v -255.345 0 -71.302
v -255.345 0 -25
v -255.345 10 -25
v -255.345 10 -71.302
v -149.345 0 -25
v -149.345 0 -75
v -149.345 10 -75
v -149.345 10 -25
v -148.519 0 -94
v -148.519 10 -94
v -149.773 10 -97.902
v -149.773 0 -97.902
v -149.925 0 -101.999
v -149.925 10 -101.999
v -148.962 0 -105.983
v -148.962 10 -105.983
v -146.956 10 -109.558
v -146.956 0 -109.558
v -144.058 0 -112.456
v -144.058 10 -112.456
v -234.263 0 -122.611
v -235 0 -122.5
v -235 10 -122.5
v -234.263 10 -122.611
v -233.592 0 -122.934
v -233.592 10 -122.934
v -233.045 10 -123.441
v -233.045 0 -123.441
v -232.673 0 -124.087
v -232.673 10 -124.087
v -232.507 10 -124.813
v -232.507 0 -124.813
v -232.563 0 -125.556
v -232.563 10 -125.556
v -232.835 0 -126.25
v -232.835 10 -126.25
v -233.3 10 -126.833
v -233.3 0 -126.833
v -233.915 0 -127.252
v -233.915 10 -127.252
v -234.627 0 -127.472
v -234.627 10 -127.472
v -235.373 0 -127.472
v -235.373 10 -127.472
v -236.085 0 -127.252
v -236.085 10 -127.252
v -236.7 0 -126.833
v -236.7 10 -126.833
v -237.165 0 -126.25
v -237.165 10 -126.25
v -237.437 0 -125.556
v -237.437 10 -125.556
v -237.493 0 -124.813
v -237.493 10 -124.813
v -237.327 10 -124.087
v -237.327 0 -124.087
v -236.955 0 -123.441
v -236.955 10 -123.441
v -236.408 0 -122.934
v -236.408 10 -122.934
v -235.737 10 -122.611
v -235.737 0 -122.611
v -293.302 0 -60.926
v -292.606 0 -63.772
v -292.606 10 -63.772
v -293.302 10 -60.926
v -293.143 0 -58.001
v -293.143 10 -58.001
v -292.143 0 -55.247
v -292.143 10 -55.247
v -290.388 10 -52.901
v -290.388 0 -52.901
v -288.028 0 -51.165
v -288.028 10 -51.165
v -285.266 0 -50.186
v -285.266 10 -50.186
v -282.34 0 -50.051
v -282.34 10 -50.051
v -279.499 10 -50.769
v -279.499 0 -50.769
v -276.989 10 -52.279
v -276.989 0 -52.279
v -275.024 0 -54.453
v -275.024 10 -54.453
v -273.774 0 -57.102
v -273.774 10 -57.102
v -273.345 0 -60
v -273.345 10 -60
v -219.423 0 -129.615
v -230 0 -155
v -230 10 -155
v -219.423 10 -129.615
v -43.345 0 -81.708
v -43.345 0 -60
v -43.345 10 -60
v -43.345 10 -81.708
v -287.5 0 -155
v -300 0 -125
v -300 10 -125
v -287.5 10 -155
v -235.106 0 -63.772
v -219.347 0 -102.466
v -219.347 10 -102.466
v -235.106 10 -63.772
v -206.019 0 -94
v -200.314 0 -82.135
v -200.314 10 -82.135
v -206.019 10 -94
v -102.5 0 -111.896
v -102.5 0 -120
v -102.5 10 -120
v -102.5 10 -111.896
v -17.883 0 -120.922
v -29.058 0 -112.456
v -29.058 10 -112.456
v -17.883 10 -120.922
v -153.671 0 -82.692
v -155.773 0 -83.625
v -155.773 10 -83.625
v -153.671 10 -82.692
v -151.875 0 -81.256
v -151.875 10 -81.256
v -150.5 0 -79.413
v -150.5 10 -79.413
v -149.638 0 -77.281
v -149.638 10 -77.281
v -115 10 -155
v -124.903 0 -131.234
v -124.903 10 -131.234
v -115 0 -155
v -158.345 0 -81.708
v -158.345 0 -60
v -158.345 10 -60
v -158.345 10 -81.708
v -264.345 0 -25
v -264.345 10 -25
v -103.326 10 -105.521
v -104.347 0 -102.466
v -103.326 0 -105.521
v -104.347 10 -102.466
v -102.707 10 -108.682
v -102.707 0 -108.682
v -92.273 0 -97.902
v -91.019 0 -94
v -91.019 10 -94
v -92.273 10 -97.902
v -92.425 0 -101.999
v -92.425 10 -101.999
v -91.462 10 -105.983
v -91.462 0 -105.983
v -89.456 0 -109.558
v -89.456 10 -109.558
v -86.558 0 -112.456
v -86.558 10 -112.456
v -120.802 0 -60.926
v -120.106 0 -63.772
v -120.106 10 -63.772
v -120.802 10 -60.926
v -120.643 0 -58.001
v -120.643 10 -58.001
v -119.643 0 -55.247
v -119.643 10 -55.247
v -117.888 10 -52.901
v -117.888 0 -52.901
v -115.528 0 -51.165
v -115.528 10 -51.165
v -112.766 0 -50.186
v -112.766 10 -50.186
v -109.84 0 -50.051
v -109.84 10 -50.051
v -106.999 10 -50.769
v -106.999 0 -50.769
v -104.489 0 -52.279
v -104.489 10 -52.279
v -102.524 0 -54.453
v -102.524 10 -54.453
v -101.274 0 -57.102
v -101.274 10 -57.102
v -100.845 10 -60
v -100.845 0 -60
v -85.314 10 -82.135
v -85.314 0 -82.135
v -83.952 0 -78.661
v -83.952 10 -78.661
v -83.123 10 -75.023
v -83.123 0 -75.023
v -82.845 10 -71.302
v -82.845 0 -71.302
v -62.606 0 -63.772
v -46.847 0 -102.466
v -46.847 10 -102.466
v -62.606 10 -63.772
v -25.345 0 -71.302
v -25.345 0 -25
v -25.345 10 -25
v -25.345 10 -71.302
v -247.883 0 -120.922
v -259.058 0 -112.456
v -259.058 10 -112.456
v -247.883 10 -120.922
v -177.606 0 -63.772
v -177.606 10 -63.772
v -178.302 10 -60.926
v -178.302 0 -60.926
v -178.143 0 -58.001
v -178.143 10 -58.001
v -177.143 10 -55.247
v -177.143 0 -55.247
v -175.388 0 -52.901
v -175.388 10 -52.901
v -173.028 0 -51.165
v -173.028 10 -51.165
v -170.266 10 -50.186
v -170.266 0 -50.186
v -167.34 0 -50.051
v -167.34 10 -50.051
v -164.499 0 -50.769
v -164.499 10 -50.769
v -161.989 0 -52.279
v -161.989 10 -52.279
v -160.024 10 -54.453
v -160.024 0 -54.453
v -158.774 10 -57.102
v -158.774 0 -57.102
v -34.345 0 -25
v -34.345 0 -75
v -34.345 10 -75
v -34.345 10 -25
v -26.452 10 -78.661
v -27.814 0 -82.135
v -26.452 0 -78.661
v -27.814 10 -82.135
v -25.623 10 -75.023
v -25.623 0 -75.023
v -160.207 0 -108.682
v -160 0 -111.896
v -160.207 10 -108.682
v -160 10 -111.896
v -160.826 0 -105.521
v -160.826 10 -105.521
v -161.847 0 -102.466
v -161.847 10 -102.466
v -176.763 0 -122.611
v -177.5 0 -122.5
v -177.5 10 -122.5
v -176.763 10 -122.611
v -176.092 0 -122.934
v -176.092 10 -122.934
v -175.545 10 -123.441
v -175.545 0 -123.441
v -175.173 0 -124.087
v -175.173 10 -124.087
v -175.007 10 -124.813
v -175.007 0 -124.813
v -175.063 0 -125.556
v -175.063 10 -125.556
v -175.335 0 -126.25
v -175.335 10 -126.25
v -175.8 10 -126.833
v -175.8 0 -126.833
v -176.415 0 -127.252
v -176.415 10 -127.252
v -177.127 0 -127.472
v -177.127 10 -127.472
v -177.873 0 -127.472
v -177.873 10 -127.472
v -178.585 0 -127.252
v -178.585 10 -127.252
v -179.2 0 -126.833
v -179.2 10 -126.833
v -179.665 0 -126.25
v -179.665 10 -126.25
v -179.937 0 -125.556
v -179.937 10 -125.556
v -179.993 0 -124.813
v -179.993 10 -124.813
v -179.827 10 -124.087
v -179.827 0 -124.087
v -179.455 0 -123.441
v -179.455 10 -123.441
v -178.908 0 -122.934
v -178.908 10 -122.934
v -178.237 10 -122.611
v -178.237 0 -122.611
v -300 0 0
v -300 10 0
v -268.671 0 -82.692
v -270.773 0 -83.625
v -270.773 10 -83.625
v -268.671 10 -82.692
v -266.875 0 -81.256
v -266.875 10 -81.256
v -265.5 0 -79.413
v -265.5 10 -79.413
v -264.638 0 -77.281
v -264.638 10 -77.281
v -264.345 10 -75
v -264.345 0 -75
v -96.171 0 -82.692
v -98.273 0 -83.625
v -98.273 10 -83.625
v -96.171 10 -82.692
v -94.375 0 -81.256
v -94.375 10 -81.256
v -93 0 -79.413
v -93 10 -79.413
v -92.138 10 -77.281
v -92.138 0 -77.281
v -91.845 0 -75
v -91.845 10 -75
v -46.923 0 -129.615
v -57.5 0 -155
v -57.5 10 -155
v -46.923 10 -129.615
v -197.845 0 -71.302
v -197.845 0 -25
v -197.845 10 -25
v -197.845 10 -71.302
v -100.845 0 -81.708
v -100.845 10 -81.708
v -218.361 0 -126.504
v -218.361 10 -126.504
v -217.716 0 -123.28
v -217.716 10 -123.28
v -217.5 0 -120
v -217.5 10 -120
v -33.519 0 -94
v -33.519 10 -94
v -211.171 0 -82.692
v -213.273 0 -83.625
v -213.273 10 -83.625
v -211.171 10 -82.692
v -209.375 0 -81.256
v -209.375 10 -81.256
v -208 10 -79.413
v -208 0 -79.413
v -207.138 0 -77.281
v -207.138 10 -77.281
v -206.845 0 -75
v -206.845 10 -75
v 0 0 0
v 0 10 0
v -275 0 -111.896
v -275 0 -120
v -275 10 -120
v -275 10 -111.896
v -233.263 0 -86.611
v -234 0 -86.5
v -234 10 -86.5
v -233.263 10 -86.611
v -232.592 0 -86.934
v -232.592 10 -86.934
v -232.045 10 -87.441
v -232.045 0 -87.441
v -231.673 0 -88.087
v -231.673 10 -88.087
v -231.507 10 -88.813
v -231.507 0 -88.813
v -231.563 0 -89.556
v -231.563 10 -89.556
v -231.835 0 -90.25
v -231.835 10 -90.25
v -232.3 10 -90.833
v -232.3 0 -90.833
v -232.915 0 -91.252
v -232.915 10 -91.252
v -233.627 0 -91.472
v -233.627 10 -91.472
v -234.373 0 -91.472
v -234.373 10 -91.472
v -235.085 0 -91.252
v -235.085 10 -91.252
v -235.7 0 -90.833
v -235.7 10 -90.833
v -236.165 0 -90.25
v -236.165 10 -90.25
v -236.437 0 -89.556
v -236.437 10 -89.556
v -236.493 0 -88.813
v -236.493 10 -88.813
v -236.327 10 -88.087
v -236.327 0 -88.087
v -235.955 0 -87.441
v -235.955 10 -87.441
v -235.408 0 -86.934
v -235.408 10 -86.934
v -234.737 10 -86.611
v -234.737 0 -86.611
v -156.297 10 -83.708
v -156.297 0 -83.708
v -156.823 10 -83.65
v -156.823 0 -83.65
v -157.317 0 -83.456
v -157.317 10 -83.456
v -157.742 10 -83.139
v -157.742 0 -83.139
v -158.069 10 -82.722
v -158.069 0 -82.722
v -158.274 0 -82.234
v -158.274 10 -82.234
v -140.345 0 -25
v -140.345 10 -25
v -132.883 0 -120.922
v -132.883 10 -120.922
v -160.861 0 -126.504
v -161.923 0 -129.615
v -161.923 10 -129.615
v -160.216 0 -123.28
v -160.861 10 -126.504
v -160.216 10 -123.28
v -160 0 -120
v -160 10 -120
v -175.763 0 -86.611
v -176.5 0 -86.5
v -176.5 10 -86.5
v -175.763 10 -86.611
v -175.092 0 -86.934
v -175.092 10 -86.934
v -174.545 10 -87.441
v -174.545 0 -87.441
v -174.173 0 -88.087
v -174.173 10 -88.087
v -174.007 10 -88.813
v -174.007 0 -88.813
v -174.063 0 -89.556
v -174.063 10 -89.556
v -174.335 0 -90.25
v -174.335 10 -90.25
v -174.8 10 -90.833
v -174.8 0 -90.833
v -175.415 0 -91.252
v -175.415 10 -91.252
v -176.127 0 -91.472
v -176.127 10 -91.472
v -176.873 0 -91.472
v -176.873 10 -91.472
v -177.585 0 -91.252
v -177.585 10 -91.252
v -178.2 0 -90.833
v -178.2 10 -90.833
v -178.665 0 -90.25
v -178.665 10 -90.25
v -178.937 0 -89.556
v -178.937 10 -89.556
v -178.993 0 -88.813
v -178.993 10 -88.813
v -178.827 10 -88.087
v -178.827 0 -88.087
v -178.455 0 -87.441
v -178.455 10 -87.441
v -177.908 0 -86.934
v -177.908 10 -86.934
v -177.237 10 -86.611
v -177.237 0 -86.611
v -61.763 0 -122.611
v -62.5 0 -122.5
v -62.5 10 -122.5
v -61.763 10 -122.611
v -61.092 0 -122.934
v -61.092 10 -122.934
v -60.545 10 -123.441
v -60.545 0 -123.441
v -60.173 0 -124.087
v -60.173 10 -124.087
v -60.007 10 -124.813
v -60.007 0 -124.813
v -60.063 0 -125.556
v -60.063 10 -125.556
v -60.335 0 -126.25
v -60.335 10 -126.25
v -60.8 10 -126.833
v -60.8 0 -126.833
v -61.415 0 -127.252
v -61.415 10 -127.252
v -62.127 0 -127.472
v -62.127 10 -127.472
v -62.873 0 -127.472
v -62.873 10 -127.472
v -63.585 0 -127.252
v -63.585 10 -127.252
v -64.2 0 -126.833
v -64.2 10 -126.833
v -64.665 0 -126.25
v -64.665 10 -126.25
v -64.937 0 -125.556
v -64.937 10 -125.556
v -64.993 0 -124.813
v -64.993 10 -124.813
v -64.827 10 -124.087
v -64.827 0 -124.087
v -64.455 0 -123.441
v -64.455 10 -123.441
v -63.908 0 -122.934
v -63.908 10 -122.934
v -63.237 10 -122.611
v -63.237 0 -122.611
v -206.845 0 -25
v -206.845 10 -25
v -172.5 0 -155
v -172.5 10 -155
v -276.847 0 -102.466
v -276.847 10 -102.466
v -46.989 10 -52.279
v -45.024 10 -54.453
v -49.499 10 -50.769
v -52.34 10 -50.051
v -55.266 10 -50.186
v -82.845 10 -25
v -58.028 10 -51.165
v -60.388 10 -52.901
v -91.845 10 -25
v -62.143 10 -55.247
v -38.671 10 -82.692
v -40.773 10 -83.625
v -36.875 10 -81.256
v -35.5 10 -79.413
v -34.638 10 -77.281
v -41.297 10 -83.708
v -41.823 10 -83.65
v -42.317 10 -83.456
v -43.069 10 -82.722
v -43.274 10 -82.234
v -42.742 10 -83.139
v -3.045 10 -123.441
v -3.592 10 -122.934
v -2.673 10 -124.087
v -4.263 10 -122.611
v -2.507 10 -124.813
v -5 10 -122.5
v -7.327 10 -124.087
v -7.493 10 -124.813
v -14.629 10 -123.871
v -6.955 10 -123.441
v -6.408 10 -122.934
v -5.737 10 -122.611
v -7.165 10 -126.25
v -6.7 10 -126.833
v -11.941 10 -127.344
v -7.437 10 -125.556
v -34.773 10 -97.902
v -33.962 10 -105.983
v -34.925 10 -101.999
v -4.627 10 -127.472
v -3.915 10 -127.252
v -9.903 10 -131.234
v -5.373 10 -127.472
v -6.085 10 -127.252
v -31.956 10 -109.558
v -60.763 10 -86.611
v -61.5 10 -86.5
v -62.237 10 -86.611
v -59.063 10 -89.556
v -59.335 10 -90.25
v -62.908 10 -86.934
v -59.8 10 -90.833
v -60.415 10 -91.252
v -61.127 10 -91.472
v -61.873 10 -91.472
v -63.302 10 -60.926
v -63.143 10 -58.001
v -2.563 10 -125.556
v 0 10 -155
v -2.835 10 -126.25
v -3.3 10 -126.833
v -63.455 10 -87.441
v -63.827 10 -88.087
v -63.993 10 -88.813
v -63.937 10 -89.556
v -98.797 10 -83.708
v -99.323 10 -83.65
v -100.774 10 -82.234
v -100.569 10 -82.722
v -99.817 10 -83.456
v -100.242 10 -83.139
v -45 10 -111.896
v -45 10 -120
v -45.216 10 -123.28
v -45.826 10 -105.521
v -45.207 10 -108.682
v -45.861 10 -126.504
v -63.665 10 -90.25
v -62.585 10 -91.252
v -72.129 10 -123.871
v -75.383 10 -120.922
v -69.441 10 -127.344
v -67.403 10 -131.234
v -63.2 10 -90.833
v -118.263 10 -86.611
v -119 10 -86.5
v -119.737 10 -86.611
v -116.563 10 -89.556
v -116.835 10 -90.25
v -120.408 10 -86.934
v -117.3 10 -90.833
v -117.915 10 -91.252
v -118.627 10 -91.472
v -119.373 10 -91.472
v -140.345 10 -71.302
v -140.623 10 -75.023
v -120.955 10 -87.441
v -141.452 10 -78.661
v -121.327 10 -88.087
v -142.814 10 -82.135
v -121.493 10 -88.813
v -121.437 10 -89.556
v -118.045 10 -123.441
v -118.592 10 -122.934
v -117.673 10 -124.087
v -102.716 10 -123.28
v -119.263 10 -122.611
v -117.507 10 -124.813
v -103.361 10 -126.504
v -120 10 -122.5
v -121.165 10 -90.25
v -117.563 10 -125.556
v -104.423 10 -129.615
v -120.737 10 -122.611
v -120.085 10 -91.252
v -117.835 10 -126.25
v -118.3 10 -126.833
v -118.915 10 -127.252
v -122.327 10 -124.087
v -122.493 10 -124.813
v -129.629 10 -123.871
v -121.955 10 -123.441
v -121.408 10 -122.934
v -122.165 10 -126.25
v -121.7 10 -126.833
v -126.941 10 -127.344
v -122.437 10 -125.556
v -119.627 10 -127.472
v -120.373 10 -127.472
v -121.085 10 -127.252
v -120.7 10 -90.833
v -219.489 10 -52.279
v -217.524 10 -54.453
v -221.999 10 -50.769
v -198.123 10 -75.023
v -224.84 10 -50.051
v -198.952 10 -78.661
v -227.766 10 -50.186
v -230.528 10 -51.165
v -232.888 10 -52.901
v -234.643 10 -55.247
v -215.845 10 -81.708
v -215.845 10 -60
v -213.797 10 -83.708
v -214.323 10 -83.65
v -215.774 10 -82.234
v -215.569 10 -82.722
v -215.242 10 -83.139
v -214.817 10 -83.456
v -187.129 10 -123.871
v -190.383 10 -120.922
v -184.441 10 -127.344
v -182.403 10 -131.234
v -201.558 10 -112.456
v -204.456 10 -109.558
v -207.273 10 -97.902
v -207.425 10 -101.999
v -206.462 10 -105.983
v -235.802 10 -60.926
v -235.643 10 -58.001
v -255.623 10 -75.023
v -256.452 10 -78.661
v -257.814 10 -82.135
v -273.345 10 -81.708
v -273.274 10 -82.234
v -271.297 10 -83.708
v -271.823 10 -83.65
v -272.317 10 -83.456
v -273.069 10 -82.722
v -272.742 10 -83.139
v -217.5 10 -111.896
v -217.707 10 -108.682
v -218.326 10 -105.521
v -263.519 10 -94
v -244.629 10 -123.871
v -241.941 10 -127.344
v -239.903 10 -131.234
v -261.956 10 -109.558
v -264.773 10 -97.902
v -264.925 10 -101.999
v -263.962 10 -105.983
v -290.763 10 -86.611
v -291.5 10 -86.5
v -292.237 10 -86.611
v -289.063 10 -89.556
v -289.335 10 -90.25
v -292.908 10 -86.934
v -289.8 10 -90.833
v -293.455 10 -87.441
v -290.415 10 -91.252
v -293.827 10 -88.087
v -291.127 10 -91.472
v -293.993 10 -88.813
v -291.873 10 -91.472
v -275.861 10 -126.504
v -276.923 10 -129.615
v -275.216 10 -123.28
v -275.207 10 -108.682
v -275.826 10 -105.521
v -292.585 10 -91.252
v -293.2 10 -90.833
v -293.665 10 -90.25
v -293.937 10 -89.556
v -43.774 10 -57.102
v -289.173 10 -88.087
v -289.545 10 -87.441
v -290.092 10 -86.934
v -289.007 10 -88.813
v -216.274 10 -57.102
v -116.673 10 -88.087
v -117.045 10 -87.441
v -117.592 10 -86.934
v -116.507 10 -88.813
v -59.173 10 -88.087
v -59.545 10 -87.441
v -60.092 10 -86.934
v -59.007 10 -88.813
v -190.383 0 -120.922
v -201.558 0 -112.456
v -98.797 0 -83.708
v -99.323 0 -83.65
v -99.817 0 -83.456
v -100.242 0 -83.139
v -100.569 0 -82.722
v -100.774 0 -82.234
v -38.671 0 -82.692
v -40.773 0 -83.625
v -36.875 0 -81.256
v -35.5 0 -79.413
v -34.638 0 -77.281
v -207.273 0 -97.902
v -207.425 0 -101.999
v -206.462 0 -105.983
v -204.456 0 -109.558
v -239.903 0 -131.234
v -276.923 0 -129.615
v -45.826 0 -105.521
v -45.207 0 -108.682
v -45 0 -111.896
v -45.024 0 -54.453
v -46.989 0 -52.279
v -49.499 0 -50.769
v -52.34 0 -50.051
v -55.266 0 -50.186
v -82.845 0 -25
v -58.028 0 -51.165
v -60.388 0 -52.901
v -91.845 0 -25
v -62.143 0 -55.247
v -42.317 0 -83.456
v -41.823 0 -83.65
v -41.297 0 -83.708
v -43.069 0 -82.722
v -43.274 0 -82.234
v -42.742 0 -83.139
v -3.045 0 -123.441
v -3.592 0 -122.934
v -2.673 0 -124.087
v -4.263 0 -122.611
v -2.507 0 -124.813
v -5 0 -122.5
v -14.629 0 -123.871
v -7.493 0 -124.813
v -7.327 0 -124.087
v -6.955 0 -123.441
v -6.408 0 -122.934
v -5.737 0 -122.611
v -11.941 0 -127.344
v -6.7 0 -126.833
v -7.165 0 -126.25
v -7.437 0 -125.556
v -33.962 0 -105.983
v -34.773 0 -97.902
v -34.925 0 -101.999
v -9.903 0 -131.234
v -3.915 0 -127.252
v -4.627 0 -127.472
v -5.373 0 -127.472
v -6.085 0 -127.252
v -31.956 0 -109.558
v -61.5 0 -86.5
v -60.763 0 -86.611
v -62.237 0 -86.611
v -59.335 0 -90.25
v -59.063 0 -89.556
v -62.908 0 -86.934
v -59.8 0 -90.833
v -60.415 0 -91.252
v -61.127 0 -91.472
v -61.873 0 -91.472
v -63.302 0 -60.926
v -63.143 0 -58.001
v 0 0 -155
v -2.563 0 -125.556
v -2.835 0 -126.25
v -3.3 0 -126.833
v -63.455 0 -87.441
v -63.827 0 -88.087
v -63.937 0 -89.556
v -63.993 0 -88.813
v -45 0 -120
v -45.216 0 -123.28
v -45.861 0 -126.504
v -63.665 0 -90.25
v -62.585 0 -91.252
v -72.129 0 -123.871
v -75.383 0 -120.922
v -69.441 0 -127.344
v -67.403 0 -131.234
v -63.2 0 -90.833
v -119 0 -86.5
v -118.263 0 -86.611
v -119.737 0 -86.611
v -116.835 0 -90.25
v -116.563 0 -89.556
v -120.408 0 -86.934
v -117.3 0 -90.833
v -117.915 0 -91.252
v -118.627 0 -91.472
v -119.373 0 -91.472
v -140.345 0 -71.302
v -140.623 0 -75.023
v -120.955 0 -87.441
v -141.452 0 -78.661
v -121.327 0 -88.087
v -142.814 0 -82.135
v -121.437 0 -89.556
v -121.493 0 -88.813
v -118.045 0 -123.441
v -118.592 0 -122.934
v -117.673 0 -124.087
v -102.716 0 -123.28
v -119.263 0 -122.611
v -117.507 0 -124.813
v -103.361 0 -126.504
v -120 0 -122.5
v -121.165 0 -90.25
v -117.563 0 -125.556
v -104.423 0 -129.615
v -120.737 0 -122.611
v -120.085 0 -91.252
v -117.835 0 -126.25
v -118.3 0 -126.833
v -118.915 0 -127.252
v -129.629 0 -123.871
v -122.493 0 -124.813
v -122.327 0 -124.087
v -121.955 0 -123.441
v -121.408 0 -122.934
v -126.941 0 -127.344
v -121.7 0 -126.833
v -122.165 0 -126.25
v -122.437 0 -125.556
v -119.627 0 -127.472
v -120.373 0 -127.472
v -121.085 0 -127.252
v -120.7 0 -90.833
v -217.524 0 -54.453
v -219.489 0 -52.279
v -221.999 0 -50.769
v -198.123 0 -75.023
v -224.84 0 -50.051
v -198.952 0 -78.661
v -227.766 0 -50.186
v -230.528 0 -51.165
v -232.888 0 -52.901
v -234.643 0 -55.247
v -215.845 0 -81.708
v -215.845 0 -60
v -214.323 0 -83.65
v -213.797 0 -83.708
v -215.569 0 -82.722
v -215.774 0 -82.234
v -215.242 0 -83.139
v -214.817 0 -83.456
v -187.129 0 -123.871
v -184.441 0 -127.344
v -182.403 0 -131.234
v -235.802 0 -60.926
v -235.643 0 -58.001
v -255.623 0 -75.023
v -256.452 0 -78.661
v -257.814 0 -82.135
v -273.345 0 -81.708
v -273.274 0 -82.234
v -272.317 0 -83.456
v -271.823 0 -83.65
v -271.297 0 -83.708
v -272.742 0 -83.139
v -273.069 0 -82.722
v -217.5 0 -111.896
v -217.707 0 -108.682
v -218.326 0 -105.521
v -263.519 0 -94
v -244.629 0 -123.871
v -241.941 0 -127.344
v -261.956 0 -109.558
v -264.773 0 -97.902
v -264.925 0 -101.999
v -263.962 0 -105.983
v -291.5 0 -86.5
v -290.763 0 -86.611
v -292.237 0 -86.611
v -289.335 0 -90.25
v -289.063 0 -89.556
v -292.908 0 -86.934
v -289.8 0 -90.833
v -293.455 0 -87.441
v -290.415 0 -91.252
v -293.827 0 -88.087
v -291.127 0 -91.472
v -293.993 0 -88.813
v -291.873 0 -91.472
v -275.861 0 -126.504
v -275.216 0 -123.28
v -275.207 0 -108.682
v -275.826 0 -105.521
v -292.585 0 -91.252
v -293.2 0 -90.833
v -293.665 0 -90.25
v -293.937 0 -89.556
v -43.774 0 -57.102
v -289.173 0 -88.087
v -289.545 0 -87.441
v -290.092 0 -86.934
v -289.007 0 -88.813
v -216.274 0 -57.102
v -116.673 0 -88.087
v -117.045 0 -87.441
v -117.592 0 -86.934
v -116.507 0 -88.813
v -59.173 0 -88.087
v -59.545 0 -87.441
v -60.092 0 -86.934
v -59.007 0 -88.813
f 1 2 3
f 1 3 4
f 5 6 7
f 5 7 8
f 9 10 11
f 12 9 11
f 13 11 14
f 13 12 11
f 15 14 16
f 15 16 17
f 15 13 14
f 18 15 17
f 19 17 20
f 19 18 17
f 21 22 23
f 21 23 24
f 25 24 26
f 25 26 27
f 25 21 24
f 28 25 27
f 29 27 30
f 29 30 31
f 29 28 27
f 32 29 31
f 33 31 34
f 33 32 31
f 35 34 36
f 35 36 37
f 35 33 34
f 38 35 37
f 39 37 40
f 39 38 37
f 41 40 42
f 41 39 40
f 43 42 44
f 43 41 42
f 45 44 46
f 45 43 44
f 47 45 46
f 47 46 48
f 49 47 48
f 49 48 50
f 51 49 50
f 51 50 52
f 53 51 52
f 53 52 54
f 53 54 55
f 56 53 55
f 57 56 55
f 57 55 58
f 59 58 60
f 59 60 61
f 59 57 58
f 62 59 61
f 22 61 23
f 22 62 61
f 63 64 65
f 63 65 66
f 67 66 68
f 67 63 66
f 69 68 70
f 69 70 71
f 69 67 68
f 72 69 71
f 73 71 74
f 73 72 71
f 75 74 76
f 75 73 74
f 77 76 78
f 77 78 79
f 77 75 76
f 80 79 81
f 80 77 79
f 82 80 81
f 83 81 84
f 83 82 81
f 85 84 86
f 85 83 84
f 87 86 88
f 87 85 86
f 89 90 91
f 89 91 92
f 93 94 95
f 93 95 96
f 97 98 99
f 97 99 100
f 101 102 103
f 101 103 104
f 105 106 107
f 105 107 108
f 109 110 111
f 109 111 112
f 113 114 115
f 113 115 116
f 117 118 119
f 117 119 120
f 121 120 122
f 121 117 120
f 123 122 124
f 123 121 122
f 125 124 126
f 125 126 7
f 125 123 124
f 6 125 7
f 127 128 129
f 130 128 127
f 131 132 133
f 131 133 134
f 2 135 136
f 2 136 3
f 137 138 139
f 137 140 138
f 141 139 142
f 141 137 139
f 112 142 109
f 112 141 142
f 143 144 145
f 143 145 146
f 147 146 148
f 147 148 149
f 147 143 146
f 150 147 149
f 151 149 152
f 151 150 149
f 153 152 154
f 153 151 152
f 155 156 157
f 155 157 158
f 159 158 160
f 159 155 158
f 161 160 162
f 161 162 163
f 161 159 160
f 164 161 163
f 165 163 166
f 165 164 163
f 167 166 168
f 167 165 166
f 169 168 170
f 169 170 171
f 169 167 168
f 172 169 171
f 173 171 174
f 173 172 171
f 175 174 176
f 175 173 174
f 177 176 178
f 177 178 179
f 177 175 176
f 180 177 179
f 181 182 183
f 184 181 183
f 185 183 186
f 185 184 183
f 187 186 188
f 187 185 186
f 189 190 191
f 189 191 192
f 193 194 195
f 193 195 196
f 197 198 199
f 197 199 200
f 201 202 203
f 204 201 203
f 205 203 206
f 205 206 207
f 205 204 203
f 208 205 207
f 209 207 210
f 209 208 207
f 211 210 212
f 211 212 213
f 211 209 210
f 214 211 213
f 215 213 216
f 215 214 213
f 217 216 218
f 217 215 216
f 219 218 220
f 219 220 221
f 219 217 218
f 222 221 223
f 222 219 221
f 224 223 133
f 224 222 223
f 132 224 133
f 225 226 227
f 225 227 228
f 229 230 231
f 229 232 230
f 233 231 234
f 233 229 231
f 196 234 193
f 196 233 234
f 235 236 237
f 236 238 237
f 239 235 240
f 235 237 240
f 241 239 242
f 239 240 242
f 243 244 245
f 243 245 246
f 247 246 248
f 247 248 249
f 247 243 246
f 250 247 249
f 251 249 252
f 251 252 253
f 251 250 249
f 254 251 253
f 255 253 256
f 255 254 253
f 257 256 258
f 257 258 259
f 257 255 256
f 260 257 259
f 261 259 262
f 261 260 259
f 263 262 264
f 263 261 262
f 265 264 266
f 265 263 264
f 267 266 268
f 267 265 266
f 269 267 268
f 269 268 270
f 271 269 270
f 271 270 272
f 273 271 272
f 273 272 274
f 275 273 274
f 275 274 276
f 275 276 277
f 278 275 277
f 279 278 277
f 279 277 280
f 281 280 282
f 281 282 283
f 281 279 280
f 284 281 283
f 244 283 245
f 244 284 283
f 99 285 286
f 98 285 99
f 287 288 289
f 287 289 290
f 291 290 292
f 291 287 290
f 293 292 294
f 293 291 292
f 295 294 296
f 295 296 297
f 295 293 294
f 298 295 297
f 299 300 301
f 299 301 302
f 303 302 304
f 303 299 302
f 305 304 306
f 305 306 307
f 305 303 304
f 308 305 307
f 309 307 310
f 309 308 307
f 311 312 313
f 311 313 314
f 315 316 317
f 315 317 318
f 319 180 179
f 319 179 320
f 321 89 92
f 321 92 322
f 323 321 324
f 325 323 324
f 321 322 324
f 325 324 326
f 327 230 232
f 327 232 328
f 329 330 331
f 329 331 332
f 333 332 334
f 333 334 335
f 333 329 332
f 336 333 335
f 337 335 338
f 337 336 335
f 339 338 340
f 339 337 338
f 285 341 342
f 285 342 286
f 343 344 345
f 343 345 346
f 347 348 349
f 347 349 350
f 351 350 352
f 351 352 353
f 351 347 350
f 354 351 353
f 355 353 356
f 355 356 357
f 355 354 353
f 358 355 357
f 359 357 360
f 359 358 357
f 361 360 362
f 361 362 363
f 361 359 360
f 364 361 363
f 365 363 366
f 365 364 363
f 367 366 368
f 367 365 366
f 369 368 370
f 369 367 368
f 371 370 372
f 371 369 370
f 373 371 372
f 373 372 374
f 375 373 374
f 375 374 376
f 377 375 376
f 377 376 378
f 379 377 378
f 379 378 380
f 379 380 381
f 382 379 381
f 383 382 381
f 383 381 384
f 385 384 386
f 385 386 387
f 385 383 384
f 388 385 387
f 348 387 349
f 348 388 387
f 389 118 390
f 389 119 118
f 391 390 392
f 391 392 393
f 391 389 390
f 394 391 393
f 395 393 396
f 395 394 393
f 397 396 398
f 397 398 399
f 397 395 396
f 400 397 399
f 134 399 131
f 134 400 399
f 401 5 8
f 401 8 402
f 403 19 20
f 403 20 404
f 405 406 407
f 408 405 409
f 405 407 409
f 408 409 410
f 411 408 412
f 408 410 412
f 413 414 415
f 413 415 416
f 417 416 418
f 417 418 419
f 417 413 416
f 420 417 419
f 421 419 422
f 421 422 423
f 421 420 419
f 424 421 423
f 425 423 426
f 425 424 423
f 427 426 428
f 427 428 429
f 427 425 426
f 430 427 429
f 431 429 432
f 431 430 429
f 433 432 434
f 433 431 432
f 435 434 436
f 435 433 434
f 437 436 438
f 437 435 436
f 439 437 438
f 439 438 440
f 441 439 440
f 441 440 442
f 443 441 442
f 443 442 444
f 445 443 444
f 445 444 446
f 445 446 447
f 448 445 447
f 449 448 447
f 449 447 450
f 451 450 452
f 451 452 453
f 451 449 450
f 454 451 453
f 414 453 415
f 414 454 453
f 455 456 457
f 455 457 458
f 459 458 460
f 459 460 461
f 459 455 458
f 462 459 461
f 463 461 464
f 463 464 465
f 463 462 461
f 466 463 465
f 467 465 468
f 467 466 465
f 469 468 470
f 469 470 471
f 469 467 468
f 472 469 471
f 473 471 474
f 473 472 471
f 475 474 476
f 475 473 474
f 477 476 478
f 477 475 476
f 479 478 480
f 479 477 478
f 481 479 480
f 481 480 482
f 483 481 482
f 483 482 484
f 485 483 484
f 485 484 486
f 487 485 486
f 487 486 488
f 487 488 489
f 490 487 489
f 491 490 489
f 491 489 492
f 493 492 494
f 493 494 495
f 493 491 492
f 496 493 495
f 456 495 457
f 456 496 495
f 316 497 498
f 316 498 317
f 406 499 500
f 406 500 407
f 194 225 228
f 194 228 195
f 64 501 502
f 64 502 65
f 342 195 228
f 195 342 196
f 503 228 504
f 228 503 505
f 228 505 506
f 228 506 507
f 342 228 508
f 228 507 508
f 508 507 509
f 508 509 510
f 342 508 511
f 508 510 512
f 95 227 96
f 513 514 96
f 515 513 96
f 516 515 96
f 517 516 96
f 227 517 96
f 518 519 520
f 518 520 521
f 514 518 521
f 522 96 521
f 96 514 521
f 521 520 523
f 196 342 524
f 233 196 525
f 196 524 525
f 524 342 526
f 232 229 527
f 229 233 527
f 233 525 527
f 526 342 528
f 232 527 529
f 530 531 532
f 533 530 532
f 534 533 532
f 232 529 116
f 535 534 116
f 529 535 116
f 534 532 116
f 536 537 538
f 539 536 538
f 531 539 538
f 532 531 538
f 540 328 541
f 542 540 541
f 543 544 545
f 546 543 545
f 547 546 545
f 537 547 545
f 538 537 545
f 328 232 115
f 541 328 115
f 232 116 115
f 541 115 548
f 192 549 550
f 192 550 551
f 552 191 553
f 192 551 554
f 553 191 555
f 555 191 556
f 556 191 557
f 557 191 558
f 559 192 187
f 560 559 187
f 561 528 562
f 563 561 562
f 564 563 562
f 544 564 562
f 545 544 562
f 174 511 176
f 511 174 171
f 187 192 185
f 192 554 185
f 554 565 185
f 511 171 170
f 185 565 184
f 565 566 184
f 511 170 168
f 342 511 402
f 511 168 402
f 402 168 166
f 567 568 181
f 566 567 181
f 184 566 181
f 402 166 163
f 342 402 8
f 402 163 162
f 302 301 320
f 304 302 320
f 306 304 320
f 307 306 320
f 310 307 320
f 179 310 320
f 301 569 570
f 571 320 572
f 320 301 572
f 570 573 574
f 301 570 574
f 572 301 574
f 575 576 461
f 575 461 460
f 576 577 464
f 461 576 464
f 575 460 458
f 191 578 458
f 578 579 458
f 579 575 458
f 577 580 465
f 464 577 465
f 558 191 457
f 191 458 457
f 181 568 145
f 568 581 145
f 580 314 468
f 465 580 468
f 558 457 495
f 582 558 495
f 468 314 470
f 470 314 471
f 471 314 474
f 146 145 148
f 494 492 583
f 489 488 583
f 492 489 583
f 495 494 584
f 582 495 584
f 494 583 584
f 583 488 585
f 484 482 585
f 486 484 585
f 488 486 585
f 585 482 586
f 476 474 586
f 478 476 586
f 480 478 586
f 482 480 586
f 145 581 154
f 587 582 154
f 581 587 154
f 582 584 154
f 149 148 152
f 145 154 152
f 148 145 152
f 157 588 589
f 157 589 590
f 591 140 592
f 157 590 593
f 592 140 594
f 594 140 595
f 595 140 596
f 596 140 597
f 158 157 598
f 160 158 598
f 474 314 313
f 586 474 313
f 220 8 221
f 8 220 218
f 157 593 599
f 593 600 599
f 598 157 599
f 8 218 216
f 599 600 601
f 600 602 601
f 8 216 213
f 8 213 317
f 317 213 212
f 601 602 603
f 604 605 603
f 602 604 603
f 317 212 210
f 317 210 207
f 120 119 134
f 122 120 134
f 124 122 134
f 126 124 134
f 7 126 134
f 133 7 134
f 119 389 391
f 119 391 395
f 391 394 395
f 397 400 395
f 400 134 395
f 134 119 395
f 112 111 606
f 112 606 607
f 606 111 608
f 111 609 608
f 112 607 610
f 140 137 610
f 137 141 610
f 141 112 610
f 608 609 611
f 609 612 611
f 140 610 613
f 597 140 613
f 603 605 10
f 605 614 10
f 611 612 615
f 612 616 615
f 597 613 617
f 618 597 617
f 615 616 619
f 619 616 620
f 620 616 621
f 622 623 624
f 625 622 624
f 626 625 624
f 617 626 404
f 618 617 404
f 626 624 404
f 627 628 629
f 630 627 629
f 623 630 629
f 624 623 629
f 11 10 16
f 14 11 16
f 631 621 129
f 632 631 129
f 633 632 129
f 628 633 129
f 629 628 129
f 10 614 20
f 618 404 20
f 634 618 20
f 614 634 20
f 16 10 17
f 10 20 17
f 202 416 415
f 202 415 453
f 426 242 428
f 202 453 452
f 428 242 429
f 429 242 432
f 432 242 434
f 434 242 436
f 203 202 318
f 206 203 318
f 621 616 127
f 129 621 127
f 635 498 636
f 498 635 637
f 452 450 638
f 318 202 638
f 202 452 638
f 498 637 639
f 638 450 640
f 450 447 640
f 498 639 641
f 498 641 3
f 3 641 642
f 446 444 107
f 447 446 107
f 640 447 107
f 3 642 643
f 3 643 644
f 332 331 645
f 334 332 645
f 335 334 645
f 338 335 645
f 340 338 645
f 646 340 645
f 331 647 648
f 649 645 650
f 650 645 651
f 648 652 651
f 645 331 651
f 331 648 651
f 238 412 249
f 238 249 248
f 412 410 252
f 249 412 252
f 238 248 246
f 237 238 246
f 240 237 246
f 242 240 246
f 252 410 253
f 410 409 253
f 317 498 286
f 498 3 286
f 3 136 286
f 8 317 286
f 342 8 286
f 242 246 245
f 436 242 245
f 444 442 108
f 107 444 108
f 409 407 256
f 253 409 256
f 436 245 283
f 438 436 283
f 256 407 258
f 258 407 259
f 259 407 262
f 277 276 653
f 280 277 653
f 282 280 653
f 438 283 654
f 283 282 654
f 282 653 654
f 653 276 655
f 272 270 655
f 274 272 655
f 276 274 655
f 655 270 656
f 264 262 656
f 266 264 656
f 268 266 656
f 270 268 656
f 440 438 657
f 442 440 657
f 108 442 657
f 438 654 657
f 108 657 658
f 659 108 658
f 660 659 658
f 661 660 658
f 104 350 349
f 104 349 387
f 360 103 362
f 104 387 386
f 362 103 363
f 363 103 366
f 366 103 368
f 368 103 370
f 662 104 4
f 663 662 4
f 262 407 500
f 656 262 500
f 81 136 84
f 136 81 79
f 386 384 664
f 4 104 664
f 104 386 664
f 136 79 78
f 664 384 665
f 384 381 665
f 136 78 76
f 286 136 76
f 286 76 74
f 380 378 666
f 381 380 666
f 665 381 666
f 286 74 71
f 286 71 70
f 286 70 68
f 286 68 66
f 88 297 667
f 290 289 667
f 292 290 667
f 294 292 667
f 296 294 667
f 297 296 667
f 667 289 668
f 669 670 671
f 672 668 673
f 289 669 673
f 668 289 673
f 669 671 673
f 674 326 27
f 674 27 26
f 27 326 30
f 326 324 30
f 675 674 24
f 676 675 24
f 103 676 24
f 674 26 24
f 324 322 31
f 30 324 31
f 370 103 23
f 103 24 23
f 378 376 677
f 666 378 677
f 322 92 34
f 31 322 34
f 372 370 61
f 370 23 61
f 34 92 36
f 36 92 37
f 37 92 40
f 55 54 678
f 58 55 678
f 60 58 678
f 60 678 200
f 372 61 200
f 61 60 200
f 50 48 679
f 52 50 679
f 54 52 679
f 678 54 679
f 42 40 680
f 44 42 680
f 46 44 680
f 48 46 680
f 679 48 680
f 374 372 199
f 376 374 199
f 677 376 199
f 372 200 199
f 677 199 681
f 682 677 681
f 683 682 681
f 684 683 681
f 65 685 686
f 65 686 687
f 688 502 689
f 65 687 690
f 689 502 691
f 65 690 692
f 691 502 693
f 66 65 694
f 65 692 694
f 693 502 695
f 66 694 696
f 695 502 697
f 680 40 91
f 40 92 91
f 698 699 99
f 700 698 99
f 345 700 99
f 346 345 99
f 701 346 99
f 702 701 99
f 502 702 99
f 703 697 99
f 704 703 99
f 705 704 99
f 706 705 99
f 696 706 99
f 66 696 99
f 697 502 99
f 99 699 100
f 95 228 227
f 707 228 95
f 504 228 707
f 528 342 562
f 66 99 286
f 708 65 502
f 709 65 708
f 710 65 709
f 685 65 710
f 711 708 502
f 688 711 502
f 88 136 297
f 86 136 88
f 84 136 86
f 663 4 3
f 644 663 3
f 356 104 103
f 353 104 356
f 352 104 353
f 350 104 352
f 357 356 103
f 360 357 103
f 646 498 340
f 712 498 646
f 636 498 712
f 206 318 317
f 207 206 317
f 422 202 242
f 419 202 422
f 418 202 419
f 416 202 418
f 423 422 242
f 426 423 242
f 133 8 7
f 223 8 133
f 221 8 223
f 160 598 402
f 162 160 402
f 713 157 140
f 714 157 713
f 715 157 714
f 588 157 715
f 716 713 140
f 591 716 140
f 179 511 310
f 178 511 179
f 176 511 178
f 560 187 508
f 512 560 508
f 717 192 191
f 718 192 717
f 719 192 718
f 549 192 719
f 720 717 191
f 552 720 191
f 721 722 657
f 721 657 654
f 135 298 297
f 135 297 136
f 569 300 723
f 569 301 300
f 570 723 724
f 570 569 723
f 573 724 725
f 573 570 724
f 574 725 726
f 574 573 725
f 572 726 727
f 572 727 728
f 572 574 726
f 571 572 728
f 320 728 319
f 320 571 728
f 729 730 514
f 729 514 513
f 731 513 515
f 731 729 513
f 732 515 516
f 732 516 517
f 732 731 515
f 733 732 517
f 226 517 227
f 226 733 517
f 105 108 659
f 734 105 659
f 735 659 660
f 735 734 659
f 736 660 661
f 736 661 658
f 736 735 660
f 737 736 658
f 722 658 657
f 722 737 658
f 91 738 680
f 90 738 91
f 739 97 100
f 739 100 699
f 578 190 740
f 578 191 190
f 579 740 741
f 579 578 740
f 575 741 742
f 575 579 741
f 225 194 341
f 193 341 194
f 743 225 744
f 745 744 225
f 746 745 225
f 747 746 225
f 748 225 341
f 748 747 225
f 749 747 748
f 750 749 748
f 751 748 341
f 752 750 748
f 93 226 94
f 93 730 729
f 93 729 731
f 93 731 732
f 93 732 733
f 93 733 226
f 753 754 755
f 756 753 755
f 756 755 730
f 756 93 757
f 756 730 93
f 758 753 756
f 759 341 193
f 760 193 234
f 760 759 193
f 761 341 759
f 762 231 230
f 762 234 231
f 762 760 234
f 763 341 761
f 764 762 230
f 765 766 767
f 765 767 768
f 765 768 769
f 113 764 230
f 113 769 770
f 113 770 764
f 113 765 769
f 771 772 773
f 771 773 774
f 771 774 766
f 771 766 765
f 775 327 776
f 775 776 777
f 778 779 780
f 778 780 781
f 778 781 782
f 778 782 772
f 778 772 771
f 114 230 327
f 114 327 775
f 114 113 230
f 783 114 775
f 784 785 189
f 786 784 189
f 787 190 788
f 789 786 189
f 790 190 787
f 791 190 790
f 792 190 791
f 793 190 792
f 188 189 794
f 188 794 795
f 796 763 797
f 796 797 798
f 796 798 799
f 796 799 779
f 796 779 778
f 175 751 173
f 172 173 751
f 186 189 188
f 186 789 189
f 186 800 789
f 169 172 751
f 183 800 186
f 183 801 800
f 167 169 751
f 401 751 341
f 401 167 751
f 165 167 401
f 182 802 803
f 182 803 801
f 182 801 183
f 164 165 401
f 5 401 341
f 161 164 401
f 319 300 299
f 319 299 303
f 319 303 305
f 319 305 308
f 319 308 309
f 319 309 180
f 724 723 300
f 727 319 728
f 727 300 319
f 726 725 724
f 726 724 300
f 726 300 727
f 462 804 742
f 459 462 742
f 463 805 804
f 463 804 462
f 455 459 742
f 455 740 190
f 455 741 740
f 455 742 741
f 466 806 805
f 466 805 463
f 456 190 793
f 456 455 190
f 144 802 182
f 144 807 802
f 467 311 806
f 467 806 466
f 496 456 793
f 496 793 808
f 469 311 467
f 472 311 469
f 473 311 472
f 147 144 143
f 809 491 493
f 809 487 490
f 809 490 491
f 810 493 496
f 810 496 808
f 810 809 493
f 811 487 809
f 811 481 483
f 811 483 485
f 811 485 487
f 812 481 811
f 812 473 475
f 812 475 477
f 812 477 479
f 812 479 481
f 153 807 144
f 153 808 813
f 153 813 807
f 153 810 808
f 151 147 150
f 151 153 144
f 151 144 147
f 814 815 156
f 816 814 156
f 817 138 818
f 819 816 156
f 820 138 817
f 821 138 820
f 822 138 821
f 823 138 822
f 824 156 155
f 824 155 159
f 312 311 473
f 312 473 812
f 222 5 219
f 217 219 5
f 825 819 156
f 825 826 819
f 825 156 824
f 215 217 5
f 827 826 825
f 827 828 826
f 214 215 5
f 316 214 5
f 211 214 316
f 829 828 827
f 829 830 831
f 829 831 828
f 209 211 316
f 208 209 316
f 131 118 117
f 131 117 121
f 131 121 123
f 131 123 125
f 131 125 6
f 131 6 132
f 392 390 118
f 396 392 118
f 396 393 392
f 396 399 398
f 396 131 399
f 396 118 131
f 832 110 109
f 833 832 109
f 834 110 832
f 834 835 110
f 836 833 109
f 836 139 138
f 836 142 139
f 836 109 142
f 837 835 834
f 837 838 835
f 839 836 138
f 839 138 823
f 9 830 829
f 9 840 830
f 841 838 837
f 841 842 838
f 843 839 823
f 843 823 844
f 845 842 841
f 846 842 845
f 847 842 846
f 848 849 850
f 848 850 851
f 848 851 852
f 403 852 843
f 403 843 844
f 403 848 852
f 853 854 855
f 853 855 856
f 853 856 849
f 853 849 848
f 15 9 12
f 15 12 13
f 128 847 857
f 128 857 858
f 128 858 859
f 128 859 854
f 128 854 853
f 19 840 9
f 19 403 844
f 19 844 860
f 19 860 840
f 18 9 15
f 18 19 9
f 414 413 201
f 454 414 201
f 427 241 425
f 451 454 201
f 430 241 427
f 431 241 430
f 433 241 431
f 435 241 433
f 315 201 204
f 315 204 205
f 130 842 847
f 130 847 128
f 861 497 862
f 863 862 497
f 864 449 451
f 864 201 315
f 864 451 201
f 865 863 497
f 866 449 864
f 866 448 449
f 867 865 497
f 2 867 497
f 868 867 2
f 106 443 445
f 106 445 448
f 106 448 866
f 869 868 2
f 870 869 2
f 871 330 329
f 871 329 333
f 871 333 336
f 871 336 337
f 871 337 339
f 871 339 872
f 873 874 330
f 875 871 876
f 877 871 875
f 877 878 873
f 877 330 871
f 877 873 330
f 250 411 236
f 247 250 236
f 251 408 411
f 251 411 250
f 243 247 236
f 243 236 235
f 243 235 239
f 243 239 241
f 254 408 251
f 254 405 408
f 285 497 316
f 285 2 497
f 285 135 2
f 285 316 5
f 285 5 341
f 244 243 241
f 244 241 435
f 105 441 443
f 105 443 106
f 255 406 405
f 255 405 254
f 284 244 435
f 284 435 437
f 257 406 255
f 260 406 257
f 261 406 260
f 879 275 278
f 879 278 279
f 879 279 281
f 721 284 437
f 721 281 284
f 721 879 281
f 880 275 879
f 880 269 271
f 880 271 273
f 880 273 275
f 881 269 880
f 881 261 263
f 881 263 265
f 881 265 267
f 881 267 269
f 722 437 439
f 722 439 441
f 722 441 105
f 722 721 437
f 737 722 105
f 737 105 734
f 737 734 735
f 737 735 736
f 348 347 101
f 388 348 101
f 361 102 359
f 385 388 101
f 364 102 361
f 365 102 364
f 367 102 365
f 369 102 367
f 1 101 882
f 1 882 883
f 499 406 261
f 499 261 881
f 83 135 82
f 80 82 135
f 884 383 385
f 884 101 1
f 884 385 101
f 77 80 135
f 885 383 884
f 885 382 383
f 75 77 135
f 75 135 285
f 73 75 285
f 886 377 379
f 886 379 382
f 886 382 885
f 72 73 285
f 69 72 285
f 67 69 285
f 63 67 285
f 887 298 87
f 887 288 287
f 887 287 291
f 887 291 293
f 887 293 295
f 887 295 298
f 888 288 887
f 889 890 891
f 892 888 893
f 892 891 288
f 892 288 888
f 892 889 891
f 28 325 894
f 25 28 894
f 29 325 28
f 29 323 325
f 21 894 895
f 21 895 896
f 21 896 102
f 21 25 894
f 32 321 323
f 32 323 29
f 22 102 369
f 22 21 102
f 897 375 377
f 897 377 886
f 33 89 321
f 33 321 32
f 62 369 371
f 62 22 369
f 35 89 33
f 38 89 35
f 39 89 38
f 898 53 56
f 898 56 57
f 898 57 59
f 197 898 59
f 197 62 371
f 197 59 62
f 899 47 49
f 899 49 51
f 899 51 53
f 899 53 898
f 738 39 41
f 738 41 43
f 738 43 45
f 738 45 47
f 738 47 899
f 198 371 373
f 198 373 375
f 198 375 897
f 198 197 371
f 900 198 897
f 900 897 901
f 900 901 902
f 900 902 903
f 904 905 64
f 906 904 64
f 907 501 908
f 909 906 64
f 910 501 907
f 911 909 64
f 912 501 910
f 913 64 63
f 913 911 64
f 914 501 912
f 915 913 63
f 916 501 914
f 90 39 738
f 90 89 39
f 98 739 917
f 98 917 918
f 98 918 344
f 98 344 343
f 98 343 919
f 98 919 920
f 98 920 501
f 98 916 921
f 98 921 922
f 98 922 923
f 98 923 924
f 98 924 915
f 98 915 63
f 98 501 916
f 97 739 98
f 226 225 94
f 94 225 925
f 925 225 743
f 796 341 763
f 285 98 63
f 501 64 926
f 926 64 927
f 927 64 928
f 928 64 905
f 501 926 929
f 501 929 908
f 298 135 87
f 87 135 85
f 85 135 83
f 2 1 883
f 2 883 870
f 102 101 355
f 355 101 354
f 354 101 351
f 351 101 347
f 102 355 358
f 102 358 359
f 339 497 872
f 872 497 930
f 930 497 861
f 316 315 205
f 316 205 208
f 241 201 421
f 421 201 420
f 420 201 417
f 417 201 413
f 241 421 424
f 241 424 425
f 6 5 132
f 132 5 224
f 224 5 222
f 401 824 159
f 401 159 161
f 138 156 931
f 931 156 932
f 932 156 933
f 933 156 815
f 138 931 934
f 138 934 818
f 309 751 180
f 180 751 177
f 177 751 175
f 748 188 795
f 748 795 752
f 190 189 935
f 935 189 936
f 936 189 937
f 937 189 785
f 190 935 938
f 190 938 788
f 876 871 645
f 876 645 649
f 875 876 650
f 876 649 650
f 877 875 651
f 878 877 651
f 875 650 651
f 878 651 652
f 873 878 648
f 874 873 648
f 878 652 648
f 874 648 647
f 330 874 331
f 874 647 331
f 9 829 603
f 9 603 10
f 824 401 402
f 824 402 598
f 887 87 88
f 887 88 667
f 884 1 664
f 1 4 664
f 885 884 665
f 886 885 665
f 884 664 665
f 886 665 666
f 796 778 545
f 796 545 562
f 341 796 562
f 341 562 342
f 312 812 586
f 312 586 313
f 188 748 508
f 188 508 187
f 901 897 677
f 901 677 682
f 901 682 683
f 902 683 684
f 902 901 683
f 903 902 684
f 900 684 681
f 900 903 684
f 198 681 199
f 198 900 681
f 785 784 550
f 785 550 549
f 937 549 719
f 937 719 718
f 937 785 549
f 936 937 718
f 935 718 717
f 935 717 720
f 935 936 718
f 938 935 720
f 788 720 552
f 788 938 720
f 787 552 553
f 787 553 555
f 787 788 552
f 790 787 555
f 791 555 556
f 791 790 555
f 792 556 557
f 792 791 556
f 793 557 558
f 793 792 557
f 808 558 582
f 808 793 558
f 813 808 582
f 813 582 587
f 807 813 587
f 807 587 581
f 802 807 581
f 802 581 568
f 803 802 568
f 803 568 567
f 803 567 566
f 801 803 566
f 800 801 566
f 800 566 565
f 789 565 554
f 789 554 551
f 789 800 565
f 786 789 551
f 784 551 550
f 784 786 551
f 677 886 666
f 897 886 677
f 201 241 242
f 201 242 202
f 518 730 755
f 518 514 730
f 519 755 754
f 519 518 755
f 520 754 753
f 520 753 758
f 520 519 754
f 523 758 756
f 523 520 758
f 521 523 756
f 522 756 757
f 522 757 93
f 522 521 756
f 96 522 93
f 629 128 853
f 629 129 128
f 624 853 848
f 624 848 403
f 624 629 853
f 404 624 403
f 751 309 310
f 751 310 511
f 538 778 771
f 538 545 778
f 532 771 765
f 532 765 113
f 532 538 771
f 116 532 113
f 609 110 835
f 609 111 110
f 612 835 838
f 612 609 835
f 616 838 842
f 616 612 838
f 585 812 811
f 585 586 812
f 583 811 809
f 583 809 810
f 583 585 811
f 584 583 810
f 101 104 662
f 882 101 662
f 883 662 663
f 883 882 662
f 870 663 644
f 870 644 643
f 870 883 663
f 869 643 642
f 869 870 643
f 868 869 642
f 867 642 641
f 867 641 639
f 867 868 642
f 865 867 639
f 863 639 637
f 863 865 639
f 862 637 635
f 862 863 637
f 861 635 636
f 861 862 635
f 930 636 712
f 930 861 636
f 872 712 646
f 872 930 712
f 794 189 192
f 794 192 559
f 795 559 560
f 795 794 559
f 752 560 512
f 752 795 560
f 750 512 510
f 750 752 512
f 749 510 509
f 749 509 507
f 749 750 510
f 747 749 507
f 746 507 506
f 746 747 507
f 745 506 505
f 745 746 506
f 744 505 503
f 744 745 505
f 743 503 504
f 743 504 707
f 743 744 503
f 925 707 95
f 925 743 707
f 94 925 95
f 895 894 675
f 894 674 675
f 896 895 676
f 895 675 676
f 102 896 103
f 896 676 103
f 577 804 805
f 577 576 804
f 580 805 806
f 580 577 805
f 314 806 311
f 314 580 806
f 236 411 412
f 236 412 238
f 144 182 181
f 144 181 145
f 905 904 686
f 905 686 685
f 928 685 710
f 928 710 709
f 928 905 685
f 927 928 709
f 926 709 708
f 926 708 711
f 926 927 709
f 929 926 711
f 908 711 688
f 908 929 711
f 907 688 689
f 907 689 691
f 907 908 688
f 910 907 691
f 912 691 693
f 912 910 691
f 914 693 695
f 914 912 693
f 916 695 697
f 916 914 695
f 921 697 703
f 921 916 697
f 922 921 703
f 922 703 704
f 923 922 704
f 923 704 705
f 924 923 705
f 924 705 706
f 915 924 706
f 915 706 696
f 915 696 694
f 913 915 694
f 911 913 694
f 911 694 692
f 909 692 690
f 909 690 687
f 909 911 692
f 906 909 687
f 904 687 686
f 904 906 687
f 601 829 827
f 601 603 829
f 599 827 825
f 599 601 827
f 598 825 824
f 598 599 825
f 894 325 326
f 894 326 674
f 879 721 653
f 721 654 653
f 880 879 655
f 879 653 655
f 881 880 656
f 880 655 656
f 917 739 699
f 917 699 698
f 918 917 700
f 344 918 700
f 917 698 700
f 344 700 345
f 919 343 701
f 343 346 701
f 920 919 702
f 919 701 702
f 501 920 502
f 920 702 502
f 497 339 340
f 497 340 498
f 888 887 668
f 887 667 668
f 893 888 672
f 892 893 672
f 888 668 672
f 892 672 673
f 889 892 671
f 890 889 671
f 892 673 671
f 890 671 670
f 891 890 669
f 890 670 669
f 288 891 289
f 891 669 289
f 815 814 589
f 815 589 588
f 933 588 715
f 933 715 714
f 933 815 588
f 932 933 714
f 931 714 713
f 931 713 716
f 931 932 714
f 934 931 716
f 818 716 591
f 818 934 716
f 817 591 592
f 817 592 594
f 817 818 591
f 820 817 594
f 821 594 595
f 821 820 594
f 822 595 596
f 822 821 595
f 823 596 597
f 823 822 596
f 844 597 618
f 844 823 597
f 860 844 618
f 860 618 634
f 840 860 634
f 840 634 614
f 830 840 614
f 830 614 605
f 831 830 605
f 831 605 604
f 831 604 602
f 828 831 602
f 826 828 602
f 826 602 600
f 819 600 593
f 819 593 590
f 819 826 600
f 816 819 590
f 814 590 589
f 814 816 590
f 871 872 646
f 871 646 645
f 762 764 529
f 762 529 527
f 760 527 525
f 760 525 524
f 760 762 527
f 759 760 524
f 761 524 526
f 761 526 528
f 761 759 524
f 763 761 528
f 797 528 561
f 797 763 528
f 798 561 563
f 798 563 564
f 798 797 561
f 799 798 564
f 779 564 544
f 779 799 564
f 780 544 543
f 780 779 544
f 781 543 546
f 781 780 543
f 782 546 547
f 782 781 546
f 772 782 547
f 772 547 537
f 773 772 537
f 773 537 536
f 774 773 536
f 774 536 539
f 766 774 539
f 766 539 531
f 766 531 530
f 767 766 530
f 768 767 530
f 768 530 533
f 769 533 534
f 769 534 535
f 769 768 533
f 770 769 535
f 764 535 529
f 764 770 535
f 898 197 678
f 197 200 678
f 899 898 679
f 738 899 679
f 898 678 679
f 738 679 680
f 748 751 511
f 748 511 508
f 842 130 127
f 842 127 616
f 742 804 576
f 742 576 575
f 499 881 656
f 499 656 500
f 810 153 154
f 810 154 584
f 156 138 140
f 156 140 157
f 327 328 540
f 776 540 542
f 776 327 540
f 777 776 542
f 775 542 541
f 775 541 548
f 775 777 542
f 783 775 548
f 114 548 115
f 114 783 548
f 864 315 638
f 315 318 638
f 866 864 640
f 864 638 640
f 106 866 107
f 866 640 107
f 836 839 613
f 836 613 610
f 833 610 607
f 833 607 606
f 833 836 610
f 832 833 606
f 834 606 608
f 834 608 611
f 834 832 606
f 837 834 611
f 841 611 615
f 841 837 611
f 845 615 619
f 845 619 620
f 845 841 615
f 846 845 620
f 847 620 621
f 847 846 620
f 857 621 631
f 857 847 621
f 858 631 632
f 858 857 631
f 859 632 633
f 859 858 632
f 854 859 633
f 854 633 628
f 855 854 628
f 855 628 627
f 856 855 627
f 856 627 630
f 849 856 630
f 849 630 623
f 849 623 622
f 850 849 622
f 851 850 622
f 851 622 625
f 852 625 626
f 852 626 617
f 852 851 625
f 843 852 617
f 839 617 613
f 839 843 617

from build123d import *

# Parameters (mm, degrees)
SKETCH1_R           = 2.5
BOSS_EXTRUDE1_DEPTH = 10
FILLET1_R           = 25
FILLET2_R           = 2


with BuildPart() as part:
    # Sketch1 → Boss-Extrude1 (new body)
    with BuildSketch(Plane(origin=(0, 0, 0), x_dir=(1, 0, 0), z_dir=(0, 1, 0))):
        with BuildLine():
            Line((0, 0), (-300, 0))
            Line((-300, 0), (-300, 125))
            Line((-300, 125), (-287.5, 155))
            Line((-287.5, 155), (-275, 125))
            Line((-275, 125), (-275, 107))
            Line((-275, 107), (-292.60586559, 63.771946566))
            ThreePointArc((-292.60586559, 63.771946566), (-285.266321562, 50.186402284), (-273.344525562, 60))
            Line((-273.344525562, 60), (-273.344525562, 84))
            ThreePointArc((-273.344525562, 84), (-266.980564532, 81.363961031), (-264.344525562, 75))
            Line((-264.344525562, 75), (-264.344525562, 25))
            Line((-264.344525562, 25), (-255.344525562, 25))
            Line((-255.344525562, 25), (-255.344525563, 77))
            Line((-255.344525563, 77), (-263.518505835, 94))
            ThreePointArc((-263.518505835, 94), (-264.580199309, 104.023888208), (-259.057764575, 112.456458543))
            Line((-259.057764575, 112.456458543), (-242.5, 125))
            Line((-242.5, 125), (-230, 155))
            Line((-230, 155), (-217.5, 125))
            Line((-217.5, 125), (-217.5, 107))
            Line((-217.5, 107), (-235.10586559, 63.771946566))
            ThreePointArc((-235.10586559, 63.771946566), (-227.766321562, 50.186402284), (-215.844525562, 60))
            Line((-215.844525562, 60), (-215.844525562, 84))
            ThreePointArc((-215.844525562, 84), (-209.480564532, 81.363961031), (-206.844525562, 75))
            Line((-206.844525562, 75), (-206.844525562, 25))
            Line((-206.844525562, 25), (-197.844525562, 25))
            Line((-197.844525562, 25), (-197.844525563, 77))
            Line((-197.844525563, 77), (-206.018505835, 94))
            ThreePointArc((-206.018505835, 94), (-207.080199309, 104.023888208), (-201.557764575, 112.456458543))
            Line((-201.557764575, 112.456458543), (-185, 125))
            Line((-185, 125), (-172.5, 155))
            Line((-172.5, 155), (-160, 125))
            Line((-160, 125), (-160, 107))
            Line((-160, 107), (-177.60586559, 63.771946566))
            ThreePointArc((-177.60586559, 63.771946566), (-170.266321562, 50.186402284), (-158.344525563, 60))
            Line((-158.344525563, 60), (-158.344525563, 84))
            ThreePointArc((-158.344525563, 84), (-151.980564532, 81.363961031), (-149.344525563, 75))
            Line((-149.344525563, 75), (-149.344525563, 25))
            Line((-149.344525563, 25), (-140.344525563, 25))
            Line((-140.344525563, 25), (-140.344525563, 77))
            Line((-140.344525563, 77), (-148.518505835, 94))
            ThreePointArc((-148.518505835, 94), (-149.580199309, 104.023888208), (-144.057764575, 112.456458543))
            Line((-144.057764575, 112.456458543), (-127.5, 125))
            Line((-127.5, 125), (-115, 155))
            Line((-115, 155), (-102.5, 125))
            Line((-102.5, 125), (-102.5, 107))
            Line((-102.5, 107), (-120.10586559, 63.771946566))
            ThreePointArc((-120.10586559, 63.771946566), (-112.766321562, 50.186402284), (-100.844525563, 60))
            Line((-100.844525563, 60), (-100.844525563, 84))
            ThreePointArc((-100.844525563, 84), (-94.480564532, 81.363961031), (-91.844525563, 75))
            Line((-91.844525563, 75), (-91.844525563, 25))
            Line((-91.844525563, 25), (-82.844525563, 25))
            Line((-82.844525563, 25), (-82.844525563, 77))
            Line((-82.844525563, 77), (-91.018505835, 94))
            ThreePointArc((-91.018505835, 94), (-92.080199309, 104.023888208), (-86.557764575, 112.456458543))
            Line((-86.557764575, 112.456458543), (-70, 125))
            Line((-70, 125), (-57.5, 155))
            Line((-57.5, 155), (-45, 125))
            Line((-45, 125), (-45, 107))
            Line((-45, 107), (-62.60586559, 63.771946566))
            ThreePointArc((-62.60586559, 63.771946566), (-55.266321562, 50.186402284), (-43.344525562, 60))
            Line((-43.344525562, 60), (-43.344525562, 84))
            ThreePointArc((-43.344525562, 84), (-36.980564532, 81.363961031), (-34.344525562, 75))
            Line((-34.344525562, 75), (-34.344525562, 25))
            Line((-34.344525562, 25), (-25.344525562, 25))
            Line((-25.344525562, 25), (-25.344525563, 77))
            Line((-25.344525563, 77), (-33.518505835, 94))
            ThreePointArc((-33.518505835, 94), (-34.580199309, 104.023888208), (-29.057764575, 112.456458543))
            Line((-29.057764575, 112.456458543), (-12.5, 125))
            Line((-12.5, 125), (0, 155))
            Line((0, 155), (0, 0))
        make_face()
        with Locations(Location((-5, 125, 0), (0, 0, 270))):
            Circle(SKETCH1_R, mode=Mode.SUBTRACT)
        with Locations(Location((-61.5, 89, 0), (0, 0, 270))):
            Circle(SKETCH1_R, mode=Mode.SUBTRACT)
        with Locations(Location((-62.5, 125, 0), (0, 0, 270))):
            Circle(SKETCH1_R, mode=Mode.SUBTRACT)
        with Locations(Location((-119, 89, 0), (0, 0, 270))):
            Circle(SKETCH1_R, mode=Mode.SUBTRACT)
        with Locations(Location((-120, 125, 0), (0, 0, 270))):
            Circle(SKETCH1_R, mode=Mode.SUBTRACT)
        with Locations(Location((-176.5, 89, 0), (0, 0, 270))):
            Circle(SKETCH1_R, mode=Mode.SUBTRACT)
        with Locations(Location((-177.5, 125, 0), (0, 0, 270))):
            Circle(SKETCH1_R, mode=Mode.SUBTRACT)
        with Locations(Location((-234, 89, 0), (0, 0, 270))):
            Circle(SKETCH1_R, mode=Mode.SUBTRACT)
        with Locations(Location((-235, 125, 0), (0, 0, 270))):
            Circle(SKETCH1_R, mode=Mode.SUBTRACT)
        with Locations(Location((-291.5, 89, 0), (0, 0, 270))):
            Circle(SKETCH1_R, mode=Mode.SUBTRACT)
    extrude(amount=BOSS_EXTRUDE1_DEPTH)

    # Fillet1
    fillet1_edges = [part.edges().sort_by_distance(p)[0] for p in [
        (-275, 5, -125),
        (-275, 5, -107),
        (-255.344525563, 5, -77),
        (-242.5, 5, -125),
        (-217.5, 5, -125),
        (-217.5, 5, -107),
        (-197.844525563, 5, -77),
        (-185, 5, -125),
        (-160, 5, -125),
        (-160, 5, -107),
        (-140.344525563, 5, -77),
        (-127.5, 5, -125),
        (-102.5, 5, -125),
        (-102.5, 5, -107),
        (-82.844525563, 5, -77),
        (-70, 5, -125),
        (-45, 5, -125),
        (-45, 5, -107),
        (-25.344525563, 5, -77),
        (-12.5, 5, -125),
    ]]
    fillet(fillet1_edges, radius=FILLET1_R)

    # Fillet2
    fillet2_edges = [part.edges().sort_by_distance(p)[0] for p in [
        (-273.344525562, 5, -84),
        (-215.844525562, 5, -84),
        (-158.344525563, 5, -84),
        (-100.844525563, 5, -84),
        (-43.344525562, 5, -84),
    ]]
    fillet(fillet2_edges, radius=FILLET2_R)


solid = part.part
